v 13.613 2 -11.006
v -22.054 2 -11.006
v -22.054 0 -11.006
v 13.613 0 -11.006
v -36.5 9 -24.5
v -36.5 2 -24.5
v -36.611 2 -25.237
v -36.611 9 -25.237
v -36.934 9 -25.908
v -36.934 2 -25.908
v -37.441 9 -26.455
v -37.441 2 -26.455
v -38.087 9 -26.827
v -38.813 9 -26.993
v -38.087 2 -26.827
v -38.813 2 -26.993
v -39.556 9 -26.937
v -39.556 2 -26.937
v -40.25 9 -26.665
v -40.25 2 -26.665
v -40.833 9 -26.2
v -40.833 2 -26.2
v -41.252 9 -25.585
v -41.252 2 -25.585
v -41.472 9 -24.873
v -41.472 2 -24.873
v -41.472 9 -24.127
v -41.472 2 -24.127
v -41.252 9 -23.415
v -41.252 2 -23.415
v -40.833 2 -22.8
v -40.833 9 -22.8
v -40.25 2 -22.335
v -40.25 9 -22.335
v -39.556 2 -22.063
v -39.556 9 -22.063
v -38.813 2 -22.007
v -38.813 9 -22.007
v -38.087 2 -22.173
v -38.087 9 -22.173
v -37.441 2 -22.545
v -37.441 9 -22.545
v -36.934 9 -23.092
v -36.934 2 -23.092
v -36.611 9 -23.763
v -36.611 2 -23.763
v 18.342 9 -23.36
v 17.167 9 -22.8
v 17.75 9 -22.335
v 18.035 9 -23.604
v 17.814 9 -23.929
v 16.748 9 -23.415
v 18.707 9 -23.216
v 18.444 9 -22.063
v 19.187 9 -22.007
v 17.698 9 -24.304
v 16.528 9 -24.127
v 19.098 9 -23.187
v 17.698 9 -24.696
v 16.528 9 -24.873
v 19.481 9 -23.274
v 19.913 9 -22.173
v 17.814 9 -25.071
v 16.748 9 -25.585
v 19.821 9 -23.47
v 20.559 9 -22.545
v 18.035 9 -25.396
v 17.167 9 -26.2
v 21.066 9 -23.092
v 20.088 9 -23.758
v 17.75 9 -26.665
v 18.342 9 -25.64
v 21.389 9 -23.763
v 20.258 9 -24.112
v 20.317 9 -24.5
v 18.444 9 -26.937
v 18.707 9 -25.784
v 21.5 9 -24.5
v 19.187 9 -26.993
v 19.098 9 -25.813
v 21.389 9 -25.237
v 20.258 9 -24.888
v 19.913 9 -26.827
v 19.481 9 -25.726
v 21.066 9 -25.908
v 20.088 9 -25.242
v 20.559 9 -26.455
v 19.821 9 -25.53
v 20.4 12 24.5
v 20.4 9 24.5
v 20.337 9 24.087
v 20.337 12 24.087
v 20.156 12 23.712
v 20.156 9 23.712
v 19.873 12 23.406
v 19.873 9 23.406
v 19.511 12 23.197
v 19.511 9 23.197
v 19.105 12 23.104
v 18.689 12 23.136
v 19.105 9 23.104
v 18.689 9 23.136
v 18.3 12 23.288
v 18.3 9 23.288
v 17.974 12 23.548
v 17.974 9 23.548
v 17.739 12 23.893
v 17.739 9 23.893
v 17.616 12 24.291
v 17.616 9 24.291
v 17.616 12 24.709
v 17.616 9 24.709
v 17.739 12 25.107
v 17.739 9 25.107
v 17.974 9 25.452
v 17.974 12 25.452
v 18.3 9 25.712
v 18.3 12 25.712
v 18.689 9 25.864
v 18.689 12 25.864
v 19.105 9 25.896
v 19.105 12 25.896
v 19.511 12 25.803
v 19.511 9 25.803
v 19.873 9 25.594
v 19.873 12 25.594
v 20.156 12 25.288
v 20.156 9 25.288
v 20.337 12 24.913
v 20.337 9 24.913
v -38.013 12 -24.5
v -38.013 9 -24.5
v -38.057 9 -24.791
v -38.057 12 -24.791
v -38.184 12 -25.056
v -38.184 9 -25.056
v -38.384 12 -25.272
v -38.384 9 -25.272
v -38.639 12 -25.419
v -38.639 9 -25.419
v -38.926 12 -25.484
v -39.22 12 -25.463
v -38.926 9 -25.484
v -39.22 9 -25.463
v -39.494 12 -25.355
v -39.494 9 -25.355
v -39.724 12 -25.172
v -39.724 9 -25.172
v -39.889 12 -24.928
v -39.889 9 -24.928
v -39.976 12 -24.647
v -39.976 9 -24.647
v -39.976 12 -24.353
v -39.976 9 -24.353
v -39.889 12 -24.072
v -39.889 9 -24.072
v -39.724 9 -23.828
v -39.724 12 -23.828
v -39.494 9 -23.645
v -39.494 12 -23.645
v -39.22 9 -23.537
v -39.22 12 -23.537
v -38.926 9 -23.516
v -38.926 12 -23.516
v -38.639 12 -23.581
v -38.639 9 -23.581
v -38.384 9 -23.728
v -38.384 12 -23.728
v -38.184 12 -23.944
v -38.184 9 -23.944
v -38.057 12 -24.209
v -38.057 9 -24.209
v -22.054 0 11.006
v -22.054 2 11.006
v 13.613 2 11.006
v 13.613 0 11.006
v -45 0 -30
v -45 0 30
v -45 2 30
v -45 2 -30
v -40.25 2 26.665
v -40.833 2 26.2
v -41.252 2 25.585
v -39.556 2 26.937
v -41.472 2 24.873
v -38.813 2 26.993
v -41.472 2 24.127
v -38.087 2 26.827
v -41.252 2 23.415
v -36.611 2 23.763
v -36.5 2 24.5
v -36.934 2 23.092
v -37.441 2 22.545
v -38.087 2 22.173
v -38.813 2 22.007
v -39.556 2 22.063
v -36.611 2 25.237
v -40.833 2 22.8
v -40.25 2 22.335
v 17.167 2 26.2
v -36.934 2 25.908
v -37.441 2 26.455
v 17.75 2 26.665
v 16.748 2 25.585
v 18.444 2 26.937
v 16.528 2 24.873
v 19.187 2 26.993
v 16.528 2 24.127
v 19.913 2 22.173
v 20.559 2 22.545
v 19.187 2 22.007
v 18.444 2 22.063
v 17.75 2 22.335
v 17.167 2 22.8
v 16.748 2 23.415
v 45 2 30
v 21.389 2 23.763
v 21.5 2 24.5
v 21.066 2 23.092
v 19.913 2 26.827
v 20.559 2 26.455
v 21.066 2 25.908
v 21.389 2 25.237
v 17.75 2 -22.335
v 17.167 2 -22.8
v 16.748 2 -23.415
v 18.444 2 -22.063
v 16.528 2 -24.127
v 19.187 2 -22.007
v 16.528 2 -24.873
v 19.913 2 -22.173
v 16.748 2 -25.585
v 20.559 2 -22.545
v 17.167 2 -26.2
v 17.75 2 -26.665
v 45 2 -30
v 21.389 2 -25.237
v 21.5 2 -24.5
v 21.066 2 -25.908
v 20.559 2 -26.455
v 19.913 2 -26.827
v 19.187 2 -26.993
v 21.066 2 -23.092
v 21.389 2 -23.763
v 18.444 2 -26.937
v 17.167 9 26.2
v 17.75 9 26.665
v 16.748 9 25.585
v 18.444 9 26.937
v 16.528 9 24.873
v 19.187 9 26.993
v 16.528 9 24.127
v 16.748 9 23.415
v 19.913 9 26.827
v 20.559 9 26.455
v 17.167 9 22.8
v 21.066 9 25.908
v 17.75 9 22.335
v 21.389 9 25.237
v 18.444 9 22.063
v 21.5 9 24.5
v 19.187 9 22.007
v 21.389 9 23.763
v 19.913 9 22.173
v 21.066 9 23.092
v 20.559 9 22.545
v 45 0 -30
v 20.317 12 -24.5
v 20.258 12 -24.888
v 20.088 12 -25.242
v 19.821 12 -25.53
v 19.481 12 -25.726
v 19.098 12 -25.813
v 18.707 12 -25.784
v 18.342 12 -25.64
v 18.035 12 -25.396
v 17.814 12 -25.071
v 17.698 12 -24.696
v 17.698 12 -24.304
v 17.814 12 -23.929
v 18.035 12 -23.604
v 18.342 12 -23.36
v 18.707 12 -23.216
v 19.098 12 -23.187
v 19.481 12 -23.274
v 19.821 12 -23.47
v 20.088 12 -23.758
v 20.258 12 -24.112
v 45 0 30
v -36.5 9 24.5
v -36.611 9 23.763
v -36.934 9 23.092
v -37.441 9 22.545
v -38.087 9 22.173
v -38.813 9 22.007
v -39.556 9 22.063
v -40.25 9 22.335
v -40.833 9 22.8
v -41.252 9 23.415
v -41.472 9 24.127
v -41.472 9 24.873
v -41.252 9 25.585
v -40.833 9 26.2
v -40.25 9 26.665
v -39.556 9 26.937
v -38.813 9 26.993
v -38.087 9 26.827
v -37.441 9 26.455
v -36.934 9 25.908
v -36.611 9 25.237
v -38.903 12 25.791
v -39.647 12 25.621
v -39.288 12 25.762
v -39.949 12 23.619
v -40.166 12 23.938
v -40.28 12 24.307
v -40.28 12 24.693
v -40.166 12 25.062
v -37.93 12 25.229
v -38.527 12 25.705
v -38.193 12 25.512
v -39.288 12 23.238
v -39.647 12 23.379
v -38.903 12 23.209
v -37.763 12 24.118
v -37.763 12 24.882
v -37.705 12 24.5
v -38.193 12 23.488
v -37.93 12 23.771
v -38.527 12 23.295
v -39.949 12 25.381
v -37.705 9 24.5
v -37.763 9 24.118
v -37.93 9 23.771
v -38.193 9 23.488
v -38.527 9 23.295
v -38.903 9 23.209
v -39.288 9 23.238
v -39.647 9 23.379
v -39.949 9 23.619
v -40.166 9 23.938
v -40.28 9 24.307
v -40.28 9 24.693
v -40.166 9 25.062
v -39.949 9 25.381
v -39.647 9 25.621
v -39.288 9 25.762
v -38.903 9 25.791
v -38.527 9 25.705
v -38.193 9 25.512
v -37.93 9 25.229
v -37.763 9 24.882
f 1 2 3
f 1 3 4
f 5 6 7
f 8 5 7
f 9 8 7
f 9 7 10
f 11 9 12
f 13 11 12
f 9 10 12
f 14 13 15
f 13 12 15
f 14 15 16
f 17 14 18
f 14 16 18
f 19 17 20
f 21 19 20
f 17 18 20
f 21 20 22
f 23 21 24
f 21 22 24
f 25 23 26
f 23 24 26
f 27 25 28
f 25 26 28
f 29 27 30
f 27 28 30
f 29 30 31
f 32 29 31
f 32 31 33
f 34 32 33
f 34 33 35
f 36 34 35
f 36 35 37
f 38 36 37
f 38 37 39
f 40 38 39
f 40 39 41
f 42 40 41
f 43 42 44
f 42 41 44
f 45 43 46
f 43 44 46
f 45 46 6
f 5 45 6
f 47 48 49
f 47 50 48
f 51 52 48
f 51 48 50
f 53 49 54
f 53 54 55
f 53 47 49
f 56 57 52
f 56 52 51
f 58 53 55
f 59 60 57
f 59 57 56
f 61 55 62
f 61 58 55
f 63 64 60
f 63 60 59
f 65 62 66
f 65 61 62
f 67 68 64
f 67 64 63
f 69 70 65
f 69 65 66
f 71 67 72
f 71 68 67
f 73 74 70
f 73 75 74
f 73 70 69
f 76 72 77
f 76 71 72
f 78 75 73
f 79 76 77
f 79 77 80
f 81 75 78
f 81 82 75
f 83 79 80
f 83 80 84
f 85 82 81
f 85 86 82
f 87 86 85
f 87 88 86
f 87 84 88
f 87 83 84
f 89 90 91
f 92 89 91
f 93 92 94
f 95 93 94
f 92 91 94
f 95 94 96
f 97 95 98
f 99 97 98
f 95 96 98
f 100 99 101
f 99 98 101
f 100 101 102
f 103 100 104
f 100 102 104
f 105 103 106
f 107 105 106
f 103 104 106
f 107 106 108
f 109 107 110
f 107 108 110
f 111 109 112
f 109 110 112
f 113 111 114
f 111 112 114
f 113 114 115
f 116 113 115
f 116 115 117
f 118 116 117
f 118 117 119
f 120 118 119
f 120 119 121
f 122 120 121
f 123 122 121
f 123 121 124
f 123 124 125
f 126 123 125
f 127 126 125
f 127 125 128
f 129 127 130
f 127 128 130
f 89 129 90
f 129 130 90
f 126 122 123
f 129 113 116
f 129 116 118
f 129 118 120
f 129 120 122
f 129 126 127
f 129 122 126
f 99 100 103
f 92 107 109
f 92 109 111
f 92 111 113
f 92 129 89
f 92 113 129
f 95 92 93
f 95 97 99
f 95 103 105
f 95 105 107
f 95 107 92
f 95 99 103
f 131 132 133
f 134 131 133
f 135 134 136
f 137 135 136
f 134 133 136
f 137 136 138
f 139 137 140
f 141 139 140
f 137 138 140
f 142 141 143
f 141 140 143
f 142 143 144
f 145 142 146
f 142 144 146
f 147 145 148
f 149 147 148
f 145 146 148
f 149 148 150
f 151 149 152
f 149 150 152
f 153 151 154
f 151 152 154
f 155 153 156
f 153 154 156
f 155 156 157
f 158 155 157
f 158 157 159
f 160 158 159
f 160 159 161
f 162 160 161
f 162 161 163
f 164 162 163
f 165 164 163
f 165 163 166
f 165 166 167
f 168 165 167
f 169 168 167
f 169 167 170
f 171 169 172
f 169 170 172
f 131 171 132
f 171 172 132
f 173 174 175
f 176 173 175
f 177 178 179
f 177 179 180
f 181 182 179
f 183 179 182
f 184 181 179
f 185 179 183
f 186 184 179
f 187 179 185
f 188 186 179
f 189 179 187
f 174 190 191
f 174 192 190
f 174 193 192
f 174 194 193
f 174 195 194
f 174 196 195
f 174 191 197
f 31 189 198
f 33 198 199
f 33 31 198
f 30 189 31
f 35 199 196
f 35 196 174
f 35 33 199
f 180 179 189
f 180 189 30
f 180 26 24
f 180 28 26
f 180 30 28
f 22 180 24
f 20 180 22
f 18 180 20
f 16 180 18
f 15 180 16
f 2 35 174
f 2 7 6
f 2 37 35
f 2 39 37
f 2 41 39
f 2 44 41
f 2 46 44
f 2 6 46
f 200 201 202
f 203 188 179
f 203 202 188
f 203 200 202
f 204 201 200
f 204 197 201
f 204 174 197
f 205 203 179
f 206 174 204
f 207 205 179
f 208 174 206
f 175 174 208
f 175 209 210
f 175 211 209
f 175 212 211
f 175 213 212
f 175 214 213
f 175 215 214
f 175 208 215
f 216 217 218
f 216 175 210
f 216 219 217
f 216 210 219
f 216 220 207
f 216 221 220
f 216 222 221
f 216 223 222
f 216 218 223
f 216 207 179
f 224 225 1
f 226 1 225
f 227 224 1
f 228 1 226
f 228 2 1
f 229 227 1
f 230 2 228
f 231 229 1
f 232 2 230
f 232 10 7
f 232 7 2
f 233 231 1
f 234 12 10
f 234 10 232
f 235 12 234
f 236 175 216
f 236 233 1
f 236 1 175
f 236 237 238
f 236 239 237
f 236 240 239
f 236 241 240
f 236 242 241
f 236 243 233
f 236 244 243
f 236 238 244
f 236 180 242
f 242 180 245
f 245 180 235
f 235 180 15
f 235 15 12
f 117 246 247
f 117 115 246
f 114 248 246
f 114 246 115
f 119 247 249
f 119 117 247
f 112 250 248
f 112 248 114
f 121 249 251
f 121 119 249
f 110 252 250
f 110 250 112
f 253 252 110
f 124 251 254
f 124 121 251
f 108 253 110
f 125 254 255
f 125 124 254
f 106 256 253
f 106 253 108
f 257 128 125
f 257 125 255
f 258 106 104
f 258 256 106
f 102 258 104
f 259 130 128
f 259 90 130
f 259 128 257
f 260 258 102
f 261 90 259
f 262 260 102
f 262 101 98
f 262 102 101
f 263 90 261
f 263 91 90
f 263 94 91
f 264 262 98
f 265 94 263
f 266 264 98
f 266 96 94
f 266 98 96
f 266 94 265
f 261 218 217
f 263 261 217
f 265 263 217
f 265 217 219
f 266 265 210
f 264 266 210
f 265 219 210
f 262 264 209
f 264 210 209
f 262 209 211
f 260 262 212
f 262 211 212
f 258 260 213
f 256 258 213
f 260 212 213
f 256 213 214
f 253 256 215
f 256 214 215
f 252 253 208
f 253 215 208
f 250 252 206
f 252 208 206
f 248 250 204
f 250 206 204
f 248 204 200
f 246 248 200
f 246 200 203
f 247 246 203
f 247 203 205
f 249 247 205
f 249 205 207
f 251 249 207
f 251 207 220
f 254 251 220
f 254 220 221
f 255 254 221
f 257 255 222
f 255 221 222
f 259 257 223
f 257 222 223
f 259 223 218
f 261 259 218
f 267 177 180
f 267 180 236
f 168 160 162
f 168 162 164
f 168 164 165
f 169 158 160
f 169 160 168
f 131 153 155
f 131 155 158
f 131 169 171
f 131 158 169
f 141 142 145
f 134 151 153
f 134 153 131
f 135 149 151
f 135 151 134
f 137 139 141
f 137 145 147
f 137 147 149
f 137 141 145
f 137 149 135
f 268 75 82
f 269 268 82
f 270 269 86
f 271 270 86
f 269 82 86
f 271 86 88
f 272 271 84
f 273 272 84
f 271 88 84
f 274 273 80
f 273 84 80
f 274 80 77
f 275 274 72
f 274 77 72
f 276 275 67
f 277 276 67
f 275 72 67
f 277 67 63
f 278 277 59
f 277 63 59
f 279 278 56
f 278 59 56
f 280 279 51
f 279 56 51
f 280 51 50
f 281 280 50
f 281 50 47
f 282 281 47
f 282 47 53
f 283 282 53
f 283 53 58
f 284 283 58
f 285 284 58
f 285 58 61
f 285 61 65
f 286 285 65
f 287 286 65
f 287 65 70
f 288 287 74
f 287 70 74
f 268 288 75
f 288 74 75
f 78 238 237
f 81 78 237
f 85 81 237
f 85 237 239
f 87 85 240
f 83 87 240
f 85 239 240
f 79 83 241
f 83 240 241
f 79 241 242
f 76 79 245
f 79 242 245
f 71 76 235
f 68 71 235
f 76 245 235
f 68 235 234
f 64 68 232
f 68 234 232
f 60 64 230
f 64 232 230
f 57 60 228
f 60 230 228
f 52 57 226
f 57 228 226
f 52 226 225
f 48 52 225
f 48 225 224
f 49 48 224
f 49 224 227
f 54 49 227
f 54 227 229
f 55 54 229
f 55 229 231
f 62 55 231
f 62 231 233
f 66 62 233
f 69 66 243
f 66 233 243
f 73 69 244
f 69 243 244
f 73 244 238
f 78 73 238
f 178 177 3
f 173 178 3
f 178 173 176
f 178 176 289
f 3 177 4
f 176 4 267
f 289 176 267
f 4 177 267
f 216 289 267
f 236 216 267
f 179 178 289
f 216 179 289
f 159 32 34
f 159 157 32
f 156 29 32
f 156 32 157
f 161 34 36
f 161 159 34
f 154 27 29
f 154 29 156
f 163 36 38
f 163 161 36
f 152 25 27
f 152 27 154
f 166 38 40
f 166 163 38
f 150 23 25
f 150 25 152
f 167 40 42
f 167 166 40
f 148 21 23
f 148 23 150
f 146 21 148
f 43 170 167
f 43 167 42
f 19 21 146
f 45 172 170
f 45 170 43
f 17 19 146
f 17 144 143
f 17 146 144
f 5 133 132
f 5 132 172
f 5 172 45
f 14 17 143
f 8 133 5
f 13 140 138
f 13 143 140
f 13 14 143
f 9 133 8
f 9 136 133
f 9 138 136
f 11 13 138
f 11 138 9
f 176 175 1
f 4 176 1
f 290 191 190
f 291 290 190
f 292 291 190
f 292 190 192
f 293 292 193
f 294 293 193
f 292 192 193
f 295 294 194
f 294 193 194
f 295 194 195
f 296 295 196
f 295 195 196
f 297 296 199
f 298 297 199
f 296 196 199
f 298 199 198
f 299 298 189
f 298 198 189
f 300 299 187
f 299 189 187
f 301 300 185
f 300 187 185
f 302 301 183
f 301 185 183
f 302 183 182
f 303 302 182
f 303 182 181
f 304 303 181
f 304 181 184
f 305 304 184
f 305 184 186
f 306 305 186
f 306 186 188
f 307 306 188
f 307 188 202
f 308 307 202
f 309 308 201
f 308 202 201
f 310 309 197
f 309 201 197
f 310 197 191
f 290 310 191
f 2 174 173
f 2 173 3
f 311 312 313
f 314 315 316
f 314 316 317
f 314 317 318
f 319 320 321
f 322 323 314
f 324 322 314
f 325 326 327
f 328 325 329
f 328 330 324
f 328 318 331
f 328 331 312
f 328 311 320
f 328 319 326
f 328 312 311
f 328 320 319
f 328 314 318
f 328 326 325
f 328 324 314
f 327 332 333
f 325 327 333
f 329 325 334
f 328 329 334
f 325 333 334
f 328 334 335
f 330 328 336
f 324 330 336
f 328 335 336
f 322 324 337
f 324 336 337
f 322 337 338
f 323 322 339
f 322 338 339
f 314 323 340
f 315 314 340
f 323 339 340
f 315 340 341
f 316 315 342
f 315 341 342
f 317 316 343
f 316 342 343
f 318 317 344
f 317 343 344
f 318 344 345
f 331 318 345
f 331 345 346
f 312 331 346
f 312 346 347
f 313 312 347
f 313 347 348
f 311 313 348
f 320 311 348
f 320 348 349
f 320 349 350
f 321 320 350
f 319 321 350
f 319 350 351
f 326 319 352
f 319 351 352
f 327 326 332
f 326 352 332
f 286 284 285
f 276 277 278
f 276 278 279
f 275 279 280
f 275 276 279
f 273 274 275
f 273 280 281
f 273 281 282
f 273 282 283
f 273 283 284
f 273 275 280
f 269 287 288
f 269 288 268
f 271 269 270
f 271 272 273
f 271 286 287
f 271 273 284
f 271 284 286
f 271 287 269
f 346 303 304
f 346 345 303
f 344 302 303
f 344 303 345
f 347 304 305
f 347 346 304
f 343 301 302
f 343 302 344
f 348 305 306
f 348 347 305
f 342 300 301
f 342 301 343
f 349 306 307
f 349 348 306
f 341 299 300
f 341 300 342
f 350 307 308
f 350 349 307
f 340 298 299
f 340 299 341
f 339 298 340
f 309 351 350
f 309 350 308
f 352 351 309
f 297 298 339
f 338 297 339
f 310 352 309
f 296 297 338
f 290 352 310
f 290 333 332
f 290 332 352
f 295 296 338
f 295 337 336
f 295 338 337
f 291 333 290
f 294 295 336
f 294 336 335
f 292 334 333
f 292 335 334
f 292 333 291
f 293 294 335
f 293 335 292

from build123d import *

# Parameters (mm, degrees)
CROQUIS1_W              = 90
CROQUIS1_H              = 60
SALIENTE_EXTRUIR1_DEPTH = 2
CROQUIS2_R              = 2.5
SALIENTE_EXTRUIR2_DEPTH = 7
CROQUIS3_R              = 0.98725552
CROQUIS3_R_2            = 1.31678764
CROQUIS3_R_3            = 1.399541148
CROQUIS3_R_4            = 1.294656753
SALIENTE_EXTRUIR3_DEPTH = 3
CROQUIS4_W              = 35.666485166
CROQUIS4_H              = 22.011405482
CORTAR_EXTRUIR1_DEPTH   = 3


with BuildPart() as part:
    # Croquis1 → Saliente-Extruir1 (new body)
    with BuildSketch(Plane(origin=(0, 0, 0), x_dir=(1, 0, 0), z_dir=(0, 1, 0))):
        Rectangle(CROQUIS1_W, CROQUIS1_H)
    extrude(amount=SALIENTE_EXTRUIR1_DEPTH)

    # Croquis2 → Saliente-Extruir2 (add)
    with BuildSketch(Plane(origin=(0, 2, 0), x_dir=(1, 0, 0), z_dir=(0, 1, 0))):
        with Locations((-39, 24.5)):
            Circle(CROQUIS2_R)
        with Locations((19, 24.5)):
            Circle(CROQUIS2_R)
        with Locations((19, -24.5)):
            Circle(CROQUIS2_R)
        with Locations((-39, -24.5)):
            Circle(CROQUIS2_R)
    extrude(amount=SALIENTE_EXTRUIR2_DEPTH)

    # Croquis3 → Saliente-Extruir3 (add)
    with BuildSketch(Plane(origin=(0, 9, 0), x_dir=(1, 0, 0), z_dir=(0, 1, 0))):
        with Locations((-39, 24.5)):
            Circle(CROQUIS3_R)
        with Locations((19, 24.5)):
            Circle(CROQUIS3_R_2)
        with Locations((19, -24.5)):
            Circle(CROQUIS3_R_3)
        with Locations((-39, -24.5)):
            Circle(CROQUIS3_R_4)
    extrude(amount=SALIENTE_EXTRUIR3_DEPTH)

    # Croquis4 → Cortar-Extruir1 (cut)
    with BuildSketch(Plane(origin=(0, 2, 0), x_dir=(1, 0, 0), z_dir=(0, 1, 0))):
        with Locations((-4.220482568, 0)):
            Rectangle(CROQUIS4_W, CROQUIS4_H)
    extrude(amount=-CORTAR_EXTRUIR1_DEPTH, mode=Mode.SUBTRACT)


solid = part.part
